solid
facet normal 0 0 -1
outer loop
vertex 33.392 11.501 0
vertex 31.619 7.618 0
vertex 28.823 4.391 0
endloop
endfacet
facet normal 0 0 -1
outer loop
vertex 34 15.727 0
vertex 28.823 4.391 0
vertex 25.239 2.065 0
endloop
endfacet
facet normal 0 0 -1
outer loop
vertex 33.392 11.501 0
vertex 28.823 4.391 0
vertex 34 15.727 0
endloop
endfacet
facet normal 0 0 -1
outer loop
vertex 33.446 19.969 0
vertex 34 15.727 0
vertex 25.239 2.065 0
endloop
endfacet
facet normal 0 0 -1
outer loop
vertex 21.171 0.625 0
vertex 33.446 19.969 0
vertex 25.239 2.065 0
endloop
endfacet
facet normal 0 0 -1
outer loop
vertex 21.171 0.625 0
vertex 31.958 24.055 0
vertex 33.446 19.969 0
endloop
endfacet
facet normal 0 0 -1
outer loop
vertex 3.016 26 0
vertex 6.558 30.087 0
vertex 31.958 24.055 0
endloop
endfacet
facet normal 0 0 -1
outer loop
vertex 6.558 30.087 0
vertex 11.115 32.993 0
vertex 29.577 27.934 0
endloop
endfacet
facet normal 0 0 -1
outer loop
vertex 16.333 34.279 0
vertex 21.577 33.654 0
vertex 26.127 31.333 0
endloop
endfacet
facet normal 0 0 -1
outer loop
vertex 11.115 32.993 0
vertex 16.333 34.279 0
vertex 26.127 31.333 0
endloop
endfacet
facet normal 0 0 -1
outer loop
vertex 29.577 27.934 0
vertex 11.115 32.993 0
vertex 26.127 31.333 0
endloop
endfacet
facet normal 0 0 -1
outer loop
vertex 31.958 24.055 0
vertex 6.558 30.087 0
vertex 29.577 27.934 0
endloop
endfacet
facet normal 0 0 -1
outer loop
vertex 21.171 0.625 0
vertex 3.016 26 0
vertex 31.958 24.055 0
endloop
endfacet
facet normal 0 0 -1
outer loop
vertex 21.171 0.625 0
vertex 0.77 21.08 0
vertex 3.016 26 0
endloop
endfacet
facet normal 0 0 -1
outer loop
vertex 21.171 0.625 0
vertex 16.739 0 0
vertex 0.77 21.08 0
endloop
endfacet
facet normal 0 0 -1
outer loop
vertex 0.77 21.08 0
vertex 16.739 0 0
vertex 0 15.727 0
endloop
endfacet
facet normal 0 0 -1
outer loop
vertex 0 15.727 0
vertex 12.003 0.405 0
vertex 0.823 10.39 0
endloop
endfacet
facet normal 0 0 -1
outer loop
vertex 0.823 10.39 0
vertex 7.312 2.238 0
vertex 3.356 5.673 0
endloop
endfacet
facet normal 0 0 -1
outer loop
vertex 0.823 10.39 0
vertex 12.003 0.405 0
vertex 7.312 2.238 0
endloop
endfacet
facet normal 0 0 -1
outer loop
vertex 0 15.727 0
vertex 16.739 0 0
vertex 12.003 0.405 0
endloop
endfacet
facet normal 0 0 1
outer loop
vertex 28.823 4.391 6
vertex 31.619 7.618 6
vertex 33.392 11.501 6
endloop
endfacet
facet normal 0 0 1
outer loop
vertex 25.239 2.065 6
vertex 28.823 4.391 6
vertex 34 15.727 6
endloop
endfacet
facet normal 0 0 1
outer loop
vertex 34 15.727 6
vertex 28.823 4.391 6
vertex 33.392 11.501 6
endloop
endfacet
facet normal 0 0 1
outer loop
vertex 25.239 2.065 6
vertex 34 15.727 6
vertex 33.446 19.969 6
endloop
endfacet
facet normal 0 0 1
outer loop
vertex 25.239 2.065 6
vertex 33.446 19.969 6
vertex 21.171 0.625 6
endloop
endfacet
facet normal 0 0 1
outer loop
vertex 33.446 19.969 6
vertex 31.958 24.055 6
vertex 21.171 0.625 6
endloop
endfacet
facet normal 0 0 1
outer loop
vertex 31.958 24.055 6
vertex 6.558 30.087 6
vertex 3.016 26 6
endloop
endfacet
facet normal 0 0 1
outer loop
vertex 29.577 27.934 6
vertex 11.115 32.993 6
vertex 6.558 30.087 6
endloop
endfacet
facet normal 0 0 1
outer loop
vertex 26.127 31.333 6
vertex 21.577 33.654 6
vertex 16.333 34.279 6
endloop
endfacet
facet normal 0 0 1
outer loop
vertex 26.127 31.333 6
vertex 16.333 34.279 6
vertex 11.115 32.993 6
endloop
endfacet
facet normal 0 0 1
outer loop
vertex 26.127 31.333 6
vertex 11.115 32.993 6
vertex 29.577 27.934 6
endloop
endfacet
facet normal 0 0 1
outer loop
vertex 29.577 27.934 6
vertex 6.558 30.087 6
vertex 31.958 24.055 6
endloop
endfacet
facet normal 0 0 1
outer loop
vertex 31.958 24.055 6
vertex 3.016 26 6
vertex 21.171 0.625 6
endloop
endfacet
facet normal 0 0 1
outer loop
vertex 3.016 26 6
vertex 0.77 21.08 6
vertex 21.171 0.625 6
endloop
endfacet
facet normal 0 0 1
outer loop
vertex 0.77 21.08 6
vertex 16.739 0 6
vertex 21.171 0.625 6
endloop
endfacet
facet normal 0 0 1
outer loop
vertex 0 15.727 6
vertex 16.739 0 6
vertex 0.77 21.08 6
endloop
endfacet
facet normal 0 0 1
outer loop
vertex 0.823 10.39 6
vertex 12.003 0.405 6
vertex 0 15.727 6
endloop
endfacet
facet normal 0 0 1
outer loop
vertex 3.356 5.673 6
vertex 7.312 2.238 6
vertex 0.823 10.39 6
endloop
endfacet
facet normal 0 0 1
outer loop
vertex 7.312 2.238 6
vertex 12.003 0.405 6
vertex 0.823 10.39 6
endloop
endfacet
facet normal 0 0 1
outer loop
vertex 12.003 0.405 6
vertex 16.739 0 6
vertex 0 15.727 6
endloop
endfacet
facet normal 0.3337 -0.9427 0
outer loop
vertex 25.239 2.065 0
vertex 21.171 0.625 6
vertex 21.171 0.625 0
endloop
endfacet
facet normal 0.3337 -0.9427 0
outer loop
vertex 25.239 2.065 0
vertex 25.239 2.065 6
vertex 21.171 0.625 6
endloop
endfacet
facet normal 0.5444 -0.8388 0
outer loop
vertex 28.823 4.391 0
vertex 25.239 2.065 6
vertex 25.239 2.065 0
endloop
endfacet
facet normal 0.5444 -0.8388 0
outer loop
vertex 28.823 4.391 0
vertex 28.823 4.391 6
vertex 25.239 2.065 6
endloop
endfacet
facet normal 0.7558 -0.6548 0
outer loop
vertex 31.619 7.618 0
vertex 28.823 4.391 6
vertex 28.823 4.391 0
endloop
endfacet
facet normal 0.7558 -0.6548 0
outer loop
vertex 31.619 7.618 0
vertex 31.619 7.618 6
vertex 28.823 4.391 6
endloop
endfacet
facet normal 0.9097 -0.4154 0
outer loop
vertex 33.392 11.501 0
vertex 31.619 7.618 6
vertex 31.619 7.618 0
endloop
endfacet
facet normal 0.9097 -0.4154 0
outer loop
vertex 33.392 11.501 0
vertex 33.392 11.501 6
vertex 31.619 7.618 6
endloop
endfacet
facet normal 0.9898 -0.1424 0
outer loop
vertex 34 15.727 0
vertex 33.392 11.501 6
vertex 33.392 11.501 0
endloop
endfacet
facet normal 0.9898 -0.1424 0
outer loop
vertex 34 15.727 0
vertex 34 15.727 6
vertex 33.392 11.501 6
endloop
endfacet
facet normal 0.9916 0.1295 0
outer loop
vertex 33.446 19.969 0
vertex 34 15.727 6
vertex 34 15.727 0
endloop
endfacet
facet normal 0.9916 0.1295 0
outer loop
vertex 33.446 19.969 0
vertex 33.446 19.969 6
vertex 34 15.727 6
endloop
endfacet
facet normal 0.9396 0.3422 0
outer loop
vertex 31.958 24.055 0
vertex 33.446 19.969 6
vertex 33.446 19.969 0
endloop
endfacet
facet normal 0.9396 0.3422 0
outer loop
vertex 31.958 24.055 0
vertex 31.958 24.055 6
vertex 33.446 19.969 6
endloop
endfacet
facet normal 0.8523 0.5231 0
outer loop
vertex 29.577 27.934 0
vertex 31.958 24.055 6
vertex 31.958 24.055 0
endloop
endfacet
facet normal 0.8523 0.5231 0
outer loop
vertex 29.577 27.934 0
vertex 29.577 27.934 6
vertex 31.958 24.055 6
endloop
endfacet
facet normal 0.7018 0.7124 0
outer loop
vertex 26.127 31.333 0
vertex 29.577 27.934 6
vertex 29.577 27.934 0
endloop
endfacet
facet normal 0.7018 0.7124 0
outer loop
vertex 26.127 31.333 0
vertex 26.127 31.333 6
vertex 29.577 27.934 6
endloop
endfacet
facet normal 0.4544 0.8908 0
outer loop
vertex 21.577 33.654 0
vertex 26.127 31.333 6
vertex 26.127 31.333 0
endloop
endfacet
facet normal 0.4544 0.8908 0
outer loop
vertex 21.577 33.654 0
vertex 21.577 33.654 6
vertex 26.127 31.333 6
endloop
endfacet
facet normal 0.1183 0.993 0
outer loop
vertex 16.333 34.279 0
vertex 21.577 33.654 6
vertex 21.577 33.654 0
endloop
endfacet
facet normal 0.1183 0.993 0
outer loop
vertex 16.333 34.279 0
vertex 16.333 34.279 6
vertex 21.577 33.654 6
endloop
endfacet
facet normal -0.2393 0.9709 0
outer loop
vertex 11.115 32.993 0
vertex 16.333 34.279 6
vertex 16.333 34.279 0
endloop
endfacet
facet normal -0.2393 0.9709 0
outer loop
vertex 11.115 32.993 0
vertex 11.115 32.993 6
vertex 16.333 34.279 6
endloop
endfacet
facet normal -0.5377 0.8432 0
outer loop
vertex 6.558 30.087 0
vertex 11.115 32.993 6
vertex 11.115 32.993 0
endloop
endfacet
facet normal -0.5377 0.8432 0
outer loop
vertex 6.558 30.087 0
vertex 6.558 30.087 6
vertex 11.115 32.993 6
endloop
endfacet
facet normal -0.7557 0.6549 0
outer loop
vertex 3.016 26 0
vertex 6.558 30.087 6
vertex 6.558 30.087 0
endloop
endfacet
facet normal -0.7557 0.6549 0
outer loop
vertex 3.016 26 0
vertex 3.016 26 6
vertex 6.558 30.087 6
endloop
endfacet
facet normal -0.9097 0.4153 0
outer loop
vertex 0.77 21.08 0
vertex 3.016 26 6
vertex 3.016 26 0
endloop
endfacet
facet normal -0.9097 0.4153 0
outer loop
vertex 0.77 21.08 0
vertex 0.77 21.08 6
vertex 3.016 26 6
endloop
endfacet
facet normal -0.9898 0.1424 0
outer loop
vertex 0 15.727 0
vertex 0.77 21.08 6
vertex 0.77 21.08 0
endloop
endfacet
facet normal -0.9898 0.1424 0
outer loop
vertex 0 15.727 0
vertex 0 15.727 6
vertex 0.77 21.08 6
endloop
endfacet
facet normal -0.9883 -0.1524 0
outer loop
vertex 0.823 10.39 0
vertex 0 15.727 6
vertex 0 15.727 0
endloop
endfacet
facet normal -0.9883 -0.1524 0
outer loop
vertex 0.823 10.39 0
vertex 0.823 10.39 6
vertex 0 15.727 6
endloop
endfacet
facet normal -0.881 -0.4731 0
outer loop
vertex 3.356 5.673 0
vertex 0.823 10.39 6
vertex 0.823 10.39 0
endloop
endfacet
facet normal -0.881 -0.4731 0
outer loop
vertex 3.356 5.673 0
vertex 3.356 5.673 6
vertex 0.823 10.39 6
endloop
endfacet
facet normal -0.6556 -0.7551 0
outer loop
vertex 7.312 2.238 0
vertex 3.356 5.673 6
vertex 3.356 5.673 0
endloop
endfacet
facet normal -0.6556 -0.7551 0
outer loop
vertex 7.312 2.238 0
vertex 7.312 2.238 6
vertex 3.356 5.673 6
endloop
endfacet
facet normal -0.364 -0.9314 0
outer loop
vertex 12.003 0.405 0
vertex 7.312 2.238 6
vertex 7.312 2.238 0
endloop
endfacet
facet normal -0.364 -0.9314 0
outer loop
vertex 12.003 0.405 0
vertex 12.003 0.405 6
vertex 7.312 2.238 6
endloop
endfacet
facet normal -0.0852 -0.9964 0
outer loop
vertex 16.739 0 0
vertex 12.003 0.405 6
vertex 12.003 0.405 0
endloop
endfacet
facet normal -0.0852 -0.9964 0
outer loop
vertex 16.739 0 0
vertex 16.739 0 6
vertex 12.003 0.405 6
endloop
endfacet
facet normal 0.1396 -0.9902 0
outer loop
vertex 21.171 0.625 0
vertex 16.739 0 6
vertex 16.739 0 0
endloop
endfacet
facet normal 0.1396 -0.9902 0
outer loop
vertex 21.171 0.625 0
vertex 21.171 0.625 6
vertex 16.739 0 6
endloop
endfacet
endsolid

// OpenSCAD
$fn = 32;

// ----------------------------------------------------------------------
// Cam disc: base radius 15.0 mm, lift 4.0 mm, 22 profile points
// ----------------------------------------------------------------------

// --- parameters (mm) ---
profile_height = 6;       // extrusion height
profile_points = 22;      // points of the closed outline

profile = [[34, 15.727], [33.446, 19.969], [31.958, 24.055], [29.577, 27.934], [26.127, 31.333], [21.577, 33.654], [16.333, 34.279], [11.115, 32.993], [6.558, 30.087], [3.016, 26], [0.77, 21.08], [0, 15.727], [0.823, 10.39], [3.356, 5.673], [7.312, 2.238], [12.003, 0.405], [16.739, 0], [21.171, 0.625], [25.239, 2.065], [28.823, 4.391], [31.619, 7.618], [33.392, 11.501]];  // single closed polygon, 22 points, counter clockwise

// --- the one profile operation ---
linear_extrude(height = profile_height) polygon(points = profile);
